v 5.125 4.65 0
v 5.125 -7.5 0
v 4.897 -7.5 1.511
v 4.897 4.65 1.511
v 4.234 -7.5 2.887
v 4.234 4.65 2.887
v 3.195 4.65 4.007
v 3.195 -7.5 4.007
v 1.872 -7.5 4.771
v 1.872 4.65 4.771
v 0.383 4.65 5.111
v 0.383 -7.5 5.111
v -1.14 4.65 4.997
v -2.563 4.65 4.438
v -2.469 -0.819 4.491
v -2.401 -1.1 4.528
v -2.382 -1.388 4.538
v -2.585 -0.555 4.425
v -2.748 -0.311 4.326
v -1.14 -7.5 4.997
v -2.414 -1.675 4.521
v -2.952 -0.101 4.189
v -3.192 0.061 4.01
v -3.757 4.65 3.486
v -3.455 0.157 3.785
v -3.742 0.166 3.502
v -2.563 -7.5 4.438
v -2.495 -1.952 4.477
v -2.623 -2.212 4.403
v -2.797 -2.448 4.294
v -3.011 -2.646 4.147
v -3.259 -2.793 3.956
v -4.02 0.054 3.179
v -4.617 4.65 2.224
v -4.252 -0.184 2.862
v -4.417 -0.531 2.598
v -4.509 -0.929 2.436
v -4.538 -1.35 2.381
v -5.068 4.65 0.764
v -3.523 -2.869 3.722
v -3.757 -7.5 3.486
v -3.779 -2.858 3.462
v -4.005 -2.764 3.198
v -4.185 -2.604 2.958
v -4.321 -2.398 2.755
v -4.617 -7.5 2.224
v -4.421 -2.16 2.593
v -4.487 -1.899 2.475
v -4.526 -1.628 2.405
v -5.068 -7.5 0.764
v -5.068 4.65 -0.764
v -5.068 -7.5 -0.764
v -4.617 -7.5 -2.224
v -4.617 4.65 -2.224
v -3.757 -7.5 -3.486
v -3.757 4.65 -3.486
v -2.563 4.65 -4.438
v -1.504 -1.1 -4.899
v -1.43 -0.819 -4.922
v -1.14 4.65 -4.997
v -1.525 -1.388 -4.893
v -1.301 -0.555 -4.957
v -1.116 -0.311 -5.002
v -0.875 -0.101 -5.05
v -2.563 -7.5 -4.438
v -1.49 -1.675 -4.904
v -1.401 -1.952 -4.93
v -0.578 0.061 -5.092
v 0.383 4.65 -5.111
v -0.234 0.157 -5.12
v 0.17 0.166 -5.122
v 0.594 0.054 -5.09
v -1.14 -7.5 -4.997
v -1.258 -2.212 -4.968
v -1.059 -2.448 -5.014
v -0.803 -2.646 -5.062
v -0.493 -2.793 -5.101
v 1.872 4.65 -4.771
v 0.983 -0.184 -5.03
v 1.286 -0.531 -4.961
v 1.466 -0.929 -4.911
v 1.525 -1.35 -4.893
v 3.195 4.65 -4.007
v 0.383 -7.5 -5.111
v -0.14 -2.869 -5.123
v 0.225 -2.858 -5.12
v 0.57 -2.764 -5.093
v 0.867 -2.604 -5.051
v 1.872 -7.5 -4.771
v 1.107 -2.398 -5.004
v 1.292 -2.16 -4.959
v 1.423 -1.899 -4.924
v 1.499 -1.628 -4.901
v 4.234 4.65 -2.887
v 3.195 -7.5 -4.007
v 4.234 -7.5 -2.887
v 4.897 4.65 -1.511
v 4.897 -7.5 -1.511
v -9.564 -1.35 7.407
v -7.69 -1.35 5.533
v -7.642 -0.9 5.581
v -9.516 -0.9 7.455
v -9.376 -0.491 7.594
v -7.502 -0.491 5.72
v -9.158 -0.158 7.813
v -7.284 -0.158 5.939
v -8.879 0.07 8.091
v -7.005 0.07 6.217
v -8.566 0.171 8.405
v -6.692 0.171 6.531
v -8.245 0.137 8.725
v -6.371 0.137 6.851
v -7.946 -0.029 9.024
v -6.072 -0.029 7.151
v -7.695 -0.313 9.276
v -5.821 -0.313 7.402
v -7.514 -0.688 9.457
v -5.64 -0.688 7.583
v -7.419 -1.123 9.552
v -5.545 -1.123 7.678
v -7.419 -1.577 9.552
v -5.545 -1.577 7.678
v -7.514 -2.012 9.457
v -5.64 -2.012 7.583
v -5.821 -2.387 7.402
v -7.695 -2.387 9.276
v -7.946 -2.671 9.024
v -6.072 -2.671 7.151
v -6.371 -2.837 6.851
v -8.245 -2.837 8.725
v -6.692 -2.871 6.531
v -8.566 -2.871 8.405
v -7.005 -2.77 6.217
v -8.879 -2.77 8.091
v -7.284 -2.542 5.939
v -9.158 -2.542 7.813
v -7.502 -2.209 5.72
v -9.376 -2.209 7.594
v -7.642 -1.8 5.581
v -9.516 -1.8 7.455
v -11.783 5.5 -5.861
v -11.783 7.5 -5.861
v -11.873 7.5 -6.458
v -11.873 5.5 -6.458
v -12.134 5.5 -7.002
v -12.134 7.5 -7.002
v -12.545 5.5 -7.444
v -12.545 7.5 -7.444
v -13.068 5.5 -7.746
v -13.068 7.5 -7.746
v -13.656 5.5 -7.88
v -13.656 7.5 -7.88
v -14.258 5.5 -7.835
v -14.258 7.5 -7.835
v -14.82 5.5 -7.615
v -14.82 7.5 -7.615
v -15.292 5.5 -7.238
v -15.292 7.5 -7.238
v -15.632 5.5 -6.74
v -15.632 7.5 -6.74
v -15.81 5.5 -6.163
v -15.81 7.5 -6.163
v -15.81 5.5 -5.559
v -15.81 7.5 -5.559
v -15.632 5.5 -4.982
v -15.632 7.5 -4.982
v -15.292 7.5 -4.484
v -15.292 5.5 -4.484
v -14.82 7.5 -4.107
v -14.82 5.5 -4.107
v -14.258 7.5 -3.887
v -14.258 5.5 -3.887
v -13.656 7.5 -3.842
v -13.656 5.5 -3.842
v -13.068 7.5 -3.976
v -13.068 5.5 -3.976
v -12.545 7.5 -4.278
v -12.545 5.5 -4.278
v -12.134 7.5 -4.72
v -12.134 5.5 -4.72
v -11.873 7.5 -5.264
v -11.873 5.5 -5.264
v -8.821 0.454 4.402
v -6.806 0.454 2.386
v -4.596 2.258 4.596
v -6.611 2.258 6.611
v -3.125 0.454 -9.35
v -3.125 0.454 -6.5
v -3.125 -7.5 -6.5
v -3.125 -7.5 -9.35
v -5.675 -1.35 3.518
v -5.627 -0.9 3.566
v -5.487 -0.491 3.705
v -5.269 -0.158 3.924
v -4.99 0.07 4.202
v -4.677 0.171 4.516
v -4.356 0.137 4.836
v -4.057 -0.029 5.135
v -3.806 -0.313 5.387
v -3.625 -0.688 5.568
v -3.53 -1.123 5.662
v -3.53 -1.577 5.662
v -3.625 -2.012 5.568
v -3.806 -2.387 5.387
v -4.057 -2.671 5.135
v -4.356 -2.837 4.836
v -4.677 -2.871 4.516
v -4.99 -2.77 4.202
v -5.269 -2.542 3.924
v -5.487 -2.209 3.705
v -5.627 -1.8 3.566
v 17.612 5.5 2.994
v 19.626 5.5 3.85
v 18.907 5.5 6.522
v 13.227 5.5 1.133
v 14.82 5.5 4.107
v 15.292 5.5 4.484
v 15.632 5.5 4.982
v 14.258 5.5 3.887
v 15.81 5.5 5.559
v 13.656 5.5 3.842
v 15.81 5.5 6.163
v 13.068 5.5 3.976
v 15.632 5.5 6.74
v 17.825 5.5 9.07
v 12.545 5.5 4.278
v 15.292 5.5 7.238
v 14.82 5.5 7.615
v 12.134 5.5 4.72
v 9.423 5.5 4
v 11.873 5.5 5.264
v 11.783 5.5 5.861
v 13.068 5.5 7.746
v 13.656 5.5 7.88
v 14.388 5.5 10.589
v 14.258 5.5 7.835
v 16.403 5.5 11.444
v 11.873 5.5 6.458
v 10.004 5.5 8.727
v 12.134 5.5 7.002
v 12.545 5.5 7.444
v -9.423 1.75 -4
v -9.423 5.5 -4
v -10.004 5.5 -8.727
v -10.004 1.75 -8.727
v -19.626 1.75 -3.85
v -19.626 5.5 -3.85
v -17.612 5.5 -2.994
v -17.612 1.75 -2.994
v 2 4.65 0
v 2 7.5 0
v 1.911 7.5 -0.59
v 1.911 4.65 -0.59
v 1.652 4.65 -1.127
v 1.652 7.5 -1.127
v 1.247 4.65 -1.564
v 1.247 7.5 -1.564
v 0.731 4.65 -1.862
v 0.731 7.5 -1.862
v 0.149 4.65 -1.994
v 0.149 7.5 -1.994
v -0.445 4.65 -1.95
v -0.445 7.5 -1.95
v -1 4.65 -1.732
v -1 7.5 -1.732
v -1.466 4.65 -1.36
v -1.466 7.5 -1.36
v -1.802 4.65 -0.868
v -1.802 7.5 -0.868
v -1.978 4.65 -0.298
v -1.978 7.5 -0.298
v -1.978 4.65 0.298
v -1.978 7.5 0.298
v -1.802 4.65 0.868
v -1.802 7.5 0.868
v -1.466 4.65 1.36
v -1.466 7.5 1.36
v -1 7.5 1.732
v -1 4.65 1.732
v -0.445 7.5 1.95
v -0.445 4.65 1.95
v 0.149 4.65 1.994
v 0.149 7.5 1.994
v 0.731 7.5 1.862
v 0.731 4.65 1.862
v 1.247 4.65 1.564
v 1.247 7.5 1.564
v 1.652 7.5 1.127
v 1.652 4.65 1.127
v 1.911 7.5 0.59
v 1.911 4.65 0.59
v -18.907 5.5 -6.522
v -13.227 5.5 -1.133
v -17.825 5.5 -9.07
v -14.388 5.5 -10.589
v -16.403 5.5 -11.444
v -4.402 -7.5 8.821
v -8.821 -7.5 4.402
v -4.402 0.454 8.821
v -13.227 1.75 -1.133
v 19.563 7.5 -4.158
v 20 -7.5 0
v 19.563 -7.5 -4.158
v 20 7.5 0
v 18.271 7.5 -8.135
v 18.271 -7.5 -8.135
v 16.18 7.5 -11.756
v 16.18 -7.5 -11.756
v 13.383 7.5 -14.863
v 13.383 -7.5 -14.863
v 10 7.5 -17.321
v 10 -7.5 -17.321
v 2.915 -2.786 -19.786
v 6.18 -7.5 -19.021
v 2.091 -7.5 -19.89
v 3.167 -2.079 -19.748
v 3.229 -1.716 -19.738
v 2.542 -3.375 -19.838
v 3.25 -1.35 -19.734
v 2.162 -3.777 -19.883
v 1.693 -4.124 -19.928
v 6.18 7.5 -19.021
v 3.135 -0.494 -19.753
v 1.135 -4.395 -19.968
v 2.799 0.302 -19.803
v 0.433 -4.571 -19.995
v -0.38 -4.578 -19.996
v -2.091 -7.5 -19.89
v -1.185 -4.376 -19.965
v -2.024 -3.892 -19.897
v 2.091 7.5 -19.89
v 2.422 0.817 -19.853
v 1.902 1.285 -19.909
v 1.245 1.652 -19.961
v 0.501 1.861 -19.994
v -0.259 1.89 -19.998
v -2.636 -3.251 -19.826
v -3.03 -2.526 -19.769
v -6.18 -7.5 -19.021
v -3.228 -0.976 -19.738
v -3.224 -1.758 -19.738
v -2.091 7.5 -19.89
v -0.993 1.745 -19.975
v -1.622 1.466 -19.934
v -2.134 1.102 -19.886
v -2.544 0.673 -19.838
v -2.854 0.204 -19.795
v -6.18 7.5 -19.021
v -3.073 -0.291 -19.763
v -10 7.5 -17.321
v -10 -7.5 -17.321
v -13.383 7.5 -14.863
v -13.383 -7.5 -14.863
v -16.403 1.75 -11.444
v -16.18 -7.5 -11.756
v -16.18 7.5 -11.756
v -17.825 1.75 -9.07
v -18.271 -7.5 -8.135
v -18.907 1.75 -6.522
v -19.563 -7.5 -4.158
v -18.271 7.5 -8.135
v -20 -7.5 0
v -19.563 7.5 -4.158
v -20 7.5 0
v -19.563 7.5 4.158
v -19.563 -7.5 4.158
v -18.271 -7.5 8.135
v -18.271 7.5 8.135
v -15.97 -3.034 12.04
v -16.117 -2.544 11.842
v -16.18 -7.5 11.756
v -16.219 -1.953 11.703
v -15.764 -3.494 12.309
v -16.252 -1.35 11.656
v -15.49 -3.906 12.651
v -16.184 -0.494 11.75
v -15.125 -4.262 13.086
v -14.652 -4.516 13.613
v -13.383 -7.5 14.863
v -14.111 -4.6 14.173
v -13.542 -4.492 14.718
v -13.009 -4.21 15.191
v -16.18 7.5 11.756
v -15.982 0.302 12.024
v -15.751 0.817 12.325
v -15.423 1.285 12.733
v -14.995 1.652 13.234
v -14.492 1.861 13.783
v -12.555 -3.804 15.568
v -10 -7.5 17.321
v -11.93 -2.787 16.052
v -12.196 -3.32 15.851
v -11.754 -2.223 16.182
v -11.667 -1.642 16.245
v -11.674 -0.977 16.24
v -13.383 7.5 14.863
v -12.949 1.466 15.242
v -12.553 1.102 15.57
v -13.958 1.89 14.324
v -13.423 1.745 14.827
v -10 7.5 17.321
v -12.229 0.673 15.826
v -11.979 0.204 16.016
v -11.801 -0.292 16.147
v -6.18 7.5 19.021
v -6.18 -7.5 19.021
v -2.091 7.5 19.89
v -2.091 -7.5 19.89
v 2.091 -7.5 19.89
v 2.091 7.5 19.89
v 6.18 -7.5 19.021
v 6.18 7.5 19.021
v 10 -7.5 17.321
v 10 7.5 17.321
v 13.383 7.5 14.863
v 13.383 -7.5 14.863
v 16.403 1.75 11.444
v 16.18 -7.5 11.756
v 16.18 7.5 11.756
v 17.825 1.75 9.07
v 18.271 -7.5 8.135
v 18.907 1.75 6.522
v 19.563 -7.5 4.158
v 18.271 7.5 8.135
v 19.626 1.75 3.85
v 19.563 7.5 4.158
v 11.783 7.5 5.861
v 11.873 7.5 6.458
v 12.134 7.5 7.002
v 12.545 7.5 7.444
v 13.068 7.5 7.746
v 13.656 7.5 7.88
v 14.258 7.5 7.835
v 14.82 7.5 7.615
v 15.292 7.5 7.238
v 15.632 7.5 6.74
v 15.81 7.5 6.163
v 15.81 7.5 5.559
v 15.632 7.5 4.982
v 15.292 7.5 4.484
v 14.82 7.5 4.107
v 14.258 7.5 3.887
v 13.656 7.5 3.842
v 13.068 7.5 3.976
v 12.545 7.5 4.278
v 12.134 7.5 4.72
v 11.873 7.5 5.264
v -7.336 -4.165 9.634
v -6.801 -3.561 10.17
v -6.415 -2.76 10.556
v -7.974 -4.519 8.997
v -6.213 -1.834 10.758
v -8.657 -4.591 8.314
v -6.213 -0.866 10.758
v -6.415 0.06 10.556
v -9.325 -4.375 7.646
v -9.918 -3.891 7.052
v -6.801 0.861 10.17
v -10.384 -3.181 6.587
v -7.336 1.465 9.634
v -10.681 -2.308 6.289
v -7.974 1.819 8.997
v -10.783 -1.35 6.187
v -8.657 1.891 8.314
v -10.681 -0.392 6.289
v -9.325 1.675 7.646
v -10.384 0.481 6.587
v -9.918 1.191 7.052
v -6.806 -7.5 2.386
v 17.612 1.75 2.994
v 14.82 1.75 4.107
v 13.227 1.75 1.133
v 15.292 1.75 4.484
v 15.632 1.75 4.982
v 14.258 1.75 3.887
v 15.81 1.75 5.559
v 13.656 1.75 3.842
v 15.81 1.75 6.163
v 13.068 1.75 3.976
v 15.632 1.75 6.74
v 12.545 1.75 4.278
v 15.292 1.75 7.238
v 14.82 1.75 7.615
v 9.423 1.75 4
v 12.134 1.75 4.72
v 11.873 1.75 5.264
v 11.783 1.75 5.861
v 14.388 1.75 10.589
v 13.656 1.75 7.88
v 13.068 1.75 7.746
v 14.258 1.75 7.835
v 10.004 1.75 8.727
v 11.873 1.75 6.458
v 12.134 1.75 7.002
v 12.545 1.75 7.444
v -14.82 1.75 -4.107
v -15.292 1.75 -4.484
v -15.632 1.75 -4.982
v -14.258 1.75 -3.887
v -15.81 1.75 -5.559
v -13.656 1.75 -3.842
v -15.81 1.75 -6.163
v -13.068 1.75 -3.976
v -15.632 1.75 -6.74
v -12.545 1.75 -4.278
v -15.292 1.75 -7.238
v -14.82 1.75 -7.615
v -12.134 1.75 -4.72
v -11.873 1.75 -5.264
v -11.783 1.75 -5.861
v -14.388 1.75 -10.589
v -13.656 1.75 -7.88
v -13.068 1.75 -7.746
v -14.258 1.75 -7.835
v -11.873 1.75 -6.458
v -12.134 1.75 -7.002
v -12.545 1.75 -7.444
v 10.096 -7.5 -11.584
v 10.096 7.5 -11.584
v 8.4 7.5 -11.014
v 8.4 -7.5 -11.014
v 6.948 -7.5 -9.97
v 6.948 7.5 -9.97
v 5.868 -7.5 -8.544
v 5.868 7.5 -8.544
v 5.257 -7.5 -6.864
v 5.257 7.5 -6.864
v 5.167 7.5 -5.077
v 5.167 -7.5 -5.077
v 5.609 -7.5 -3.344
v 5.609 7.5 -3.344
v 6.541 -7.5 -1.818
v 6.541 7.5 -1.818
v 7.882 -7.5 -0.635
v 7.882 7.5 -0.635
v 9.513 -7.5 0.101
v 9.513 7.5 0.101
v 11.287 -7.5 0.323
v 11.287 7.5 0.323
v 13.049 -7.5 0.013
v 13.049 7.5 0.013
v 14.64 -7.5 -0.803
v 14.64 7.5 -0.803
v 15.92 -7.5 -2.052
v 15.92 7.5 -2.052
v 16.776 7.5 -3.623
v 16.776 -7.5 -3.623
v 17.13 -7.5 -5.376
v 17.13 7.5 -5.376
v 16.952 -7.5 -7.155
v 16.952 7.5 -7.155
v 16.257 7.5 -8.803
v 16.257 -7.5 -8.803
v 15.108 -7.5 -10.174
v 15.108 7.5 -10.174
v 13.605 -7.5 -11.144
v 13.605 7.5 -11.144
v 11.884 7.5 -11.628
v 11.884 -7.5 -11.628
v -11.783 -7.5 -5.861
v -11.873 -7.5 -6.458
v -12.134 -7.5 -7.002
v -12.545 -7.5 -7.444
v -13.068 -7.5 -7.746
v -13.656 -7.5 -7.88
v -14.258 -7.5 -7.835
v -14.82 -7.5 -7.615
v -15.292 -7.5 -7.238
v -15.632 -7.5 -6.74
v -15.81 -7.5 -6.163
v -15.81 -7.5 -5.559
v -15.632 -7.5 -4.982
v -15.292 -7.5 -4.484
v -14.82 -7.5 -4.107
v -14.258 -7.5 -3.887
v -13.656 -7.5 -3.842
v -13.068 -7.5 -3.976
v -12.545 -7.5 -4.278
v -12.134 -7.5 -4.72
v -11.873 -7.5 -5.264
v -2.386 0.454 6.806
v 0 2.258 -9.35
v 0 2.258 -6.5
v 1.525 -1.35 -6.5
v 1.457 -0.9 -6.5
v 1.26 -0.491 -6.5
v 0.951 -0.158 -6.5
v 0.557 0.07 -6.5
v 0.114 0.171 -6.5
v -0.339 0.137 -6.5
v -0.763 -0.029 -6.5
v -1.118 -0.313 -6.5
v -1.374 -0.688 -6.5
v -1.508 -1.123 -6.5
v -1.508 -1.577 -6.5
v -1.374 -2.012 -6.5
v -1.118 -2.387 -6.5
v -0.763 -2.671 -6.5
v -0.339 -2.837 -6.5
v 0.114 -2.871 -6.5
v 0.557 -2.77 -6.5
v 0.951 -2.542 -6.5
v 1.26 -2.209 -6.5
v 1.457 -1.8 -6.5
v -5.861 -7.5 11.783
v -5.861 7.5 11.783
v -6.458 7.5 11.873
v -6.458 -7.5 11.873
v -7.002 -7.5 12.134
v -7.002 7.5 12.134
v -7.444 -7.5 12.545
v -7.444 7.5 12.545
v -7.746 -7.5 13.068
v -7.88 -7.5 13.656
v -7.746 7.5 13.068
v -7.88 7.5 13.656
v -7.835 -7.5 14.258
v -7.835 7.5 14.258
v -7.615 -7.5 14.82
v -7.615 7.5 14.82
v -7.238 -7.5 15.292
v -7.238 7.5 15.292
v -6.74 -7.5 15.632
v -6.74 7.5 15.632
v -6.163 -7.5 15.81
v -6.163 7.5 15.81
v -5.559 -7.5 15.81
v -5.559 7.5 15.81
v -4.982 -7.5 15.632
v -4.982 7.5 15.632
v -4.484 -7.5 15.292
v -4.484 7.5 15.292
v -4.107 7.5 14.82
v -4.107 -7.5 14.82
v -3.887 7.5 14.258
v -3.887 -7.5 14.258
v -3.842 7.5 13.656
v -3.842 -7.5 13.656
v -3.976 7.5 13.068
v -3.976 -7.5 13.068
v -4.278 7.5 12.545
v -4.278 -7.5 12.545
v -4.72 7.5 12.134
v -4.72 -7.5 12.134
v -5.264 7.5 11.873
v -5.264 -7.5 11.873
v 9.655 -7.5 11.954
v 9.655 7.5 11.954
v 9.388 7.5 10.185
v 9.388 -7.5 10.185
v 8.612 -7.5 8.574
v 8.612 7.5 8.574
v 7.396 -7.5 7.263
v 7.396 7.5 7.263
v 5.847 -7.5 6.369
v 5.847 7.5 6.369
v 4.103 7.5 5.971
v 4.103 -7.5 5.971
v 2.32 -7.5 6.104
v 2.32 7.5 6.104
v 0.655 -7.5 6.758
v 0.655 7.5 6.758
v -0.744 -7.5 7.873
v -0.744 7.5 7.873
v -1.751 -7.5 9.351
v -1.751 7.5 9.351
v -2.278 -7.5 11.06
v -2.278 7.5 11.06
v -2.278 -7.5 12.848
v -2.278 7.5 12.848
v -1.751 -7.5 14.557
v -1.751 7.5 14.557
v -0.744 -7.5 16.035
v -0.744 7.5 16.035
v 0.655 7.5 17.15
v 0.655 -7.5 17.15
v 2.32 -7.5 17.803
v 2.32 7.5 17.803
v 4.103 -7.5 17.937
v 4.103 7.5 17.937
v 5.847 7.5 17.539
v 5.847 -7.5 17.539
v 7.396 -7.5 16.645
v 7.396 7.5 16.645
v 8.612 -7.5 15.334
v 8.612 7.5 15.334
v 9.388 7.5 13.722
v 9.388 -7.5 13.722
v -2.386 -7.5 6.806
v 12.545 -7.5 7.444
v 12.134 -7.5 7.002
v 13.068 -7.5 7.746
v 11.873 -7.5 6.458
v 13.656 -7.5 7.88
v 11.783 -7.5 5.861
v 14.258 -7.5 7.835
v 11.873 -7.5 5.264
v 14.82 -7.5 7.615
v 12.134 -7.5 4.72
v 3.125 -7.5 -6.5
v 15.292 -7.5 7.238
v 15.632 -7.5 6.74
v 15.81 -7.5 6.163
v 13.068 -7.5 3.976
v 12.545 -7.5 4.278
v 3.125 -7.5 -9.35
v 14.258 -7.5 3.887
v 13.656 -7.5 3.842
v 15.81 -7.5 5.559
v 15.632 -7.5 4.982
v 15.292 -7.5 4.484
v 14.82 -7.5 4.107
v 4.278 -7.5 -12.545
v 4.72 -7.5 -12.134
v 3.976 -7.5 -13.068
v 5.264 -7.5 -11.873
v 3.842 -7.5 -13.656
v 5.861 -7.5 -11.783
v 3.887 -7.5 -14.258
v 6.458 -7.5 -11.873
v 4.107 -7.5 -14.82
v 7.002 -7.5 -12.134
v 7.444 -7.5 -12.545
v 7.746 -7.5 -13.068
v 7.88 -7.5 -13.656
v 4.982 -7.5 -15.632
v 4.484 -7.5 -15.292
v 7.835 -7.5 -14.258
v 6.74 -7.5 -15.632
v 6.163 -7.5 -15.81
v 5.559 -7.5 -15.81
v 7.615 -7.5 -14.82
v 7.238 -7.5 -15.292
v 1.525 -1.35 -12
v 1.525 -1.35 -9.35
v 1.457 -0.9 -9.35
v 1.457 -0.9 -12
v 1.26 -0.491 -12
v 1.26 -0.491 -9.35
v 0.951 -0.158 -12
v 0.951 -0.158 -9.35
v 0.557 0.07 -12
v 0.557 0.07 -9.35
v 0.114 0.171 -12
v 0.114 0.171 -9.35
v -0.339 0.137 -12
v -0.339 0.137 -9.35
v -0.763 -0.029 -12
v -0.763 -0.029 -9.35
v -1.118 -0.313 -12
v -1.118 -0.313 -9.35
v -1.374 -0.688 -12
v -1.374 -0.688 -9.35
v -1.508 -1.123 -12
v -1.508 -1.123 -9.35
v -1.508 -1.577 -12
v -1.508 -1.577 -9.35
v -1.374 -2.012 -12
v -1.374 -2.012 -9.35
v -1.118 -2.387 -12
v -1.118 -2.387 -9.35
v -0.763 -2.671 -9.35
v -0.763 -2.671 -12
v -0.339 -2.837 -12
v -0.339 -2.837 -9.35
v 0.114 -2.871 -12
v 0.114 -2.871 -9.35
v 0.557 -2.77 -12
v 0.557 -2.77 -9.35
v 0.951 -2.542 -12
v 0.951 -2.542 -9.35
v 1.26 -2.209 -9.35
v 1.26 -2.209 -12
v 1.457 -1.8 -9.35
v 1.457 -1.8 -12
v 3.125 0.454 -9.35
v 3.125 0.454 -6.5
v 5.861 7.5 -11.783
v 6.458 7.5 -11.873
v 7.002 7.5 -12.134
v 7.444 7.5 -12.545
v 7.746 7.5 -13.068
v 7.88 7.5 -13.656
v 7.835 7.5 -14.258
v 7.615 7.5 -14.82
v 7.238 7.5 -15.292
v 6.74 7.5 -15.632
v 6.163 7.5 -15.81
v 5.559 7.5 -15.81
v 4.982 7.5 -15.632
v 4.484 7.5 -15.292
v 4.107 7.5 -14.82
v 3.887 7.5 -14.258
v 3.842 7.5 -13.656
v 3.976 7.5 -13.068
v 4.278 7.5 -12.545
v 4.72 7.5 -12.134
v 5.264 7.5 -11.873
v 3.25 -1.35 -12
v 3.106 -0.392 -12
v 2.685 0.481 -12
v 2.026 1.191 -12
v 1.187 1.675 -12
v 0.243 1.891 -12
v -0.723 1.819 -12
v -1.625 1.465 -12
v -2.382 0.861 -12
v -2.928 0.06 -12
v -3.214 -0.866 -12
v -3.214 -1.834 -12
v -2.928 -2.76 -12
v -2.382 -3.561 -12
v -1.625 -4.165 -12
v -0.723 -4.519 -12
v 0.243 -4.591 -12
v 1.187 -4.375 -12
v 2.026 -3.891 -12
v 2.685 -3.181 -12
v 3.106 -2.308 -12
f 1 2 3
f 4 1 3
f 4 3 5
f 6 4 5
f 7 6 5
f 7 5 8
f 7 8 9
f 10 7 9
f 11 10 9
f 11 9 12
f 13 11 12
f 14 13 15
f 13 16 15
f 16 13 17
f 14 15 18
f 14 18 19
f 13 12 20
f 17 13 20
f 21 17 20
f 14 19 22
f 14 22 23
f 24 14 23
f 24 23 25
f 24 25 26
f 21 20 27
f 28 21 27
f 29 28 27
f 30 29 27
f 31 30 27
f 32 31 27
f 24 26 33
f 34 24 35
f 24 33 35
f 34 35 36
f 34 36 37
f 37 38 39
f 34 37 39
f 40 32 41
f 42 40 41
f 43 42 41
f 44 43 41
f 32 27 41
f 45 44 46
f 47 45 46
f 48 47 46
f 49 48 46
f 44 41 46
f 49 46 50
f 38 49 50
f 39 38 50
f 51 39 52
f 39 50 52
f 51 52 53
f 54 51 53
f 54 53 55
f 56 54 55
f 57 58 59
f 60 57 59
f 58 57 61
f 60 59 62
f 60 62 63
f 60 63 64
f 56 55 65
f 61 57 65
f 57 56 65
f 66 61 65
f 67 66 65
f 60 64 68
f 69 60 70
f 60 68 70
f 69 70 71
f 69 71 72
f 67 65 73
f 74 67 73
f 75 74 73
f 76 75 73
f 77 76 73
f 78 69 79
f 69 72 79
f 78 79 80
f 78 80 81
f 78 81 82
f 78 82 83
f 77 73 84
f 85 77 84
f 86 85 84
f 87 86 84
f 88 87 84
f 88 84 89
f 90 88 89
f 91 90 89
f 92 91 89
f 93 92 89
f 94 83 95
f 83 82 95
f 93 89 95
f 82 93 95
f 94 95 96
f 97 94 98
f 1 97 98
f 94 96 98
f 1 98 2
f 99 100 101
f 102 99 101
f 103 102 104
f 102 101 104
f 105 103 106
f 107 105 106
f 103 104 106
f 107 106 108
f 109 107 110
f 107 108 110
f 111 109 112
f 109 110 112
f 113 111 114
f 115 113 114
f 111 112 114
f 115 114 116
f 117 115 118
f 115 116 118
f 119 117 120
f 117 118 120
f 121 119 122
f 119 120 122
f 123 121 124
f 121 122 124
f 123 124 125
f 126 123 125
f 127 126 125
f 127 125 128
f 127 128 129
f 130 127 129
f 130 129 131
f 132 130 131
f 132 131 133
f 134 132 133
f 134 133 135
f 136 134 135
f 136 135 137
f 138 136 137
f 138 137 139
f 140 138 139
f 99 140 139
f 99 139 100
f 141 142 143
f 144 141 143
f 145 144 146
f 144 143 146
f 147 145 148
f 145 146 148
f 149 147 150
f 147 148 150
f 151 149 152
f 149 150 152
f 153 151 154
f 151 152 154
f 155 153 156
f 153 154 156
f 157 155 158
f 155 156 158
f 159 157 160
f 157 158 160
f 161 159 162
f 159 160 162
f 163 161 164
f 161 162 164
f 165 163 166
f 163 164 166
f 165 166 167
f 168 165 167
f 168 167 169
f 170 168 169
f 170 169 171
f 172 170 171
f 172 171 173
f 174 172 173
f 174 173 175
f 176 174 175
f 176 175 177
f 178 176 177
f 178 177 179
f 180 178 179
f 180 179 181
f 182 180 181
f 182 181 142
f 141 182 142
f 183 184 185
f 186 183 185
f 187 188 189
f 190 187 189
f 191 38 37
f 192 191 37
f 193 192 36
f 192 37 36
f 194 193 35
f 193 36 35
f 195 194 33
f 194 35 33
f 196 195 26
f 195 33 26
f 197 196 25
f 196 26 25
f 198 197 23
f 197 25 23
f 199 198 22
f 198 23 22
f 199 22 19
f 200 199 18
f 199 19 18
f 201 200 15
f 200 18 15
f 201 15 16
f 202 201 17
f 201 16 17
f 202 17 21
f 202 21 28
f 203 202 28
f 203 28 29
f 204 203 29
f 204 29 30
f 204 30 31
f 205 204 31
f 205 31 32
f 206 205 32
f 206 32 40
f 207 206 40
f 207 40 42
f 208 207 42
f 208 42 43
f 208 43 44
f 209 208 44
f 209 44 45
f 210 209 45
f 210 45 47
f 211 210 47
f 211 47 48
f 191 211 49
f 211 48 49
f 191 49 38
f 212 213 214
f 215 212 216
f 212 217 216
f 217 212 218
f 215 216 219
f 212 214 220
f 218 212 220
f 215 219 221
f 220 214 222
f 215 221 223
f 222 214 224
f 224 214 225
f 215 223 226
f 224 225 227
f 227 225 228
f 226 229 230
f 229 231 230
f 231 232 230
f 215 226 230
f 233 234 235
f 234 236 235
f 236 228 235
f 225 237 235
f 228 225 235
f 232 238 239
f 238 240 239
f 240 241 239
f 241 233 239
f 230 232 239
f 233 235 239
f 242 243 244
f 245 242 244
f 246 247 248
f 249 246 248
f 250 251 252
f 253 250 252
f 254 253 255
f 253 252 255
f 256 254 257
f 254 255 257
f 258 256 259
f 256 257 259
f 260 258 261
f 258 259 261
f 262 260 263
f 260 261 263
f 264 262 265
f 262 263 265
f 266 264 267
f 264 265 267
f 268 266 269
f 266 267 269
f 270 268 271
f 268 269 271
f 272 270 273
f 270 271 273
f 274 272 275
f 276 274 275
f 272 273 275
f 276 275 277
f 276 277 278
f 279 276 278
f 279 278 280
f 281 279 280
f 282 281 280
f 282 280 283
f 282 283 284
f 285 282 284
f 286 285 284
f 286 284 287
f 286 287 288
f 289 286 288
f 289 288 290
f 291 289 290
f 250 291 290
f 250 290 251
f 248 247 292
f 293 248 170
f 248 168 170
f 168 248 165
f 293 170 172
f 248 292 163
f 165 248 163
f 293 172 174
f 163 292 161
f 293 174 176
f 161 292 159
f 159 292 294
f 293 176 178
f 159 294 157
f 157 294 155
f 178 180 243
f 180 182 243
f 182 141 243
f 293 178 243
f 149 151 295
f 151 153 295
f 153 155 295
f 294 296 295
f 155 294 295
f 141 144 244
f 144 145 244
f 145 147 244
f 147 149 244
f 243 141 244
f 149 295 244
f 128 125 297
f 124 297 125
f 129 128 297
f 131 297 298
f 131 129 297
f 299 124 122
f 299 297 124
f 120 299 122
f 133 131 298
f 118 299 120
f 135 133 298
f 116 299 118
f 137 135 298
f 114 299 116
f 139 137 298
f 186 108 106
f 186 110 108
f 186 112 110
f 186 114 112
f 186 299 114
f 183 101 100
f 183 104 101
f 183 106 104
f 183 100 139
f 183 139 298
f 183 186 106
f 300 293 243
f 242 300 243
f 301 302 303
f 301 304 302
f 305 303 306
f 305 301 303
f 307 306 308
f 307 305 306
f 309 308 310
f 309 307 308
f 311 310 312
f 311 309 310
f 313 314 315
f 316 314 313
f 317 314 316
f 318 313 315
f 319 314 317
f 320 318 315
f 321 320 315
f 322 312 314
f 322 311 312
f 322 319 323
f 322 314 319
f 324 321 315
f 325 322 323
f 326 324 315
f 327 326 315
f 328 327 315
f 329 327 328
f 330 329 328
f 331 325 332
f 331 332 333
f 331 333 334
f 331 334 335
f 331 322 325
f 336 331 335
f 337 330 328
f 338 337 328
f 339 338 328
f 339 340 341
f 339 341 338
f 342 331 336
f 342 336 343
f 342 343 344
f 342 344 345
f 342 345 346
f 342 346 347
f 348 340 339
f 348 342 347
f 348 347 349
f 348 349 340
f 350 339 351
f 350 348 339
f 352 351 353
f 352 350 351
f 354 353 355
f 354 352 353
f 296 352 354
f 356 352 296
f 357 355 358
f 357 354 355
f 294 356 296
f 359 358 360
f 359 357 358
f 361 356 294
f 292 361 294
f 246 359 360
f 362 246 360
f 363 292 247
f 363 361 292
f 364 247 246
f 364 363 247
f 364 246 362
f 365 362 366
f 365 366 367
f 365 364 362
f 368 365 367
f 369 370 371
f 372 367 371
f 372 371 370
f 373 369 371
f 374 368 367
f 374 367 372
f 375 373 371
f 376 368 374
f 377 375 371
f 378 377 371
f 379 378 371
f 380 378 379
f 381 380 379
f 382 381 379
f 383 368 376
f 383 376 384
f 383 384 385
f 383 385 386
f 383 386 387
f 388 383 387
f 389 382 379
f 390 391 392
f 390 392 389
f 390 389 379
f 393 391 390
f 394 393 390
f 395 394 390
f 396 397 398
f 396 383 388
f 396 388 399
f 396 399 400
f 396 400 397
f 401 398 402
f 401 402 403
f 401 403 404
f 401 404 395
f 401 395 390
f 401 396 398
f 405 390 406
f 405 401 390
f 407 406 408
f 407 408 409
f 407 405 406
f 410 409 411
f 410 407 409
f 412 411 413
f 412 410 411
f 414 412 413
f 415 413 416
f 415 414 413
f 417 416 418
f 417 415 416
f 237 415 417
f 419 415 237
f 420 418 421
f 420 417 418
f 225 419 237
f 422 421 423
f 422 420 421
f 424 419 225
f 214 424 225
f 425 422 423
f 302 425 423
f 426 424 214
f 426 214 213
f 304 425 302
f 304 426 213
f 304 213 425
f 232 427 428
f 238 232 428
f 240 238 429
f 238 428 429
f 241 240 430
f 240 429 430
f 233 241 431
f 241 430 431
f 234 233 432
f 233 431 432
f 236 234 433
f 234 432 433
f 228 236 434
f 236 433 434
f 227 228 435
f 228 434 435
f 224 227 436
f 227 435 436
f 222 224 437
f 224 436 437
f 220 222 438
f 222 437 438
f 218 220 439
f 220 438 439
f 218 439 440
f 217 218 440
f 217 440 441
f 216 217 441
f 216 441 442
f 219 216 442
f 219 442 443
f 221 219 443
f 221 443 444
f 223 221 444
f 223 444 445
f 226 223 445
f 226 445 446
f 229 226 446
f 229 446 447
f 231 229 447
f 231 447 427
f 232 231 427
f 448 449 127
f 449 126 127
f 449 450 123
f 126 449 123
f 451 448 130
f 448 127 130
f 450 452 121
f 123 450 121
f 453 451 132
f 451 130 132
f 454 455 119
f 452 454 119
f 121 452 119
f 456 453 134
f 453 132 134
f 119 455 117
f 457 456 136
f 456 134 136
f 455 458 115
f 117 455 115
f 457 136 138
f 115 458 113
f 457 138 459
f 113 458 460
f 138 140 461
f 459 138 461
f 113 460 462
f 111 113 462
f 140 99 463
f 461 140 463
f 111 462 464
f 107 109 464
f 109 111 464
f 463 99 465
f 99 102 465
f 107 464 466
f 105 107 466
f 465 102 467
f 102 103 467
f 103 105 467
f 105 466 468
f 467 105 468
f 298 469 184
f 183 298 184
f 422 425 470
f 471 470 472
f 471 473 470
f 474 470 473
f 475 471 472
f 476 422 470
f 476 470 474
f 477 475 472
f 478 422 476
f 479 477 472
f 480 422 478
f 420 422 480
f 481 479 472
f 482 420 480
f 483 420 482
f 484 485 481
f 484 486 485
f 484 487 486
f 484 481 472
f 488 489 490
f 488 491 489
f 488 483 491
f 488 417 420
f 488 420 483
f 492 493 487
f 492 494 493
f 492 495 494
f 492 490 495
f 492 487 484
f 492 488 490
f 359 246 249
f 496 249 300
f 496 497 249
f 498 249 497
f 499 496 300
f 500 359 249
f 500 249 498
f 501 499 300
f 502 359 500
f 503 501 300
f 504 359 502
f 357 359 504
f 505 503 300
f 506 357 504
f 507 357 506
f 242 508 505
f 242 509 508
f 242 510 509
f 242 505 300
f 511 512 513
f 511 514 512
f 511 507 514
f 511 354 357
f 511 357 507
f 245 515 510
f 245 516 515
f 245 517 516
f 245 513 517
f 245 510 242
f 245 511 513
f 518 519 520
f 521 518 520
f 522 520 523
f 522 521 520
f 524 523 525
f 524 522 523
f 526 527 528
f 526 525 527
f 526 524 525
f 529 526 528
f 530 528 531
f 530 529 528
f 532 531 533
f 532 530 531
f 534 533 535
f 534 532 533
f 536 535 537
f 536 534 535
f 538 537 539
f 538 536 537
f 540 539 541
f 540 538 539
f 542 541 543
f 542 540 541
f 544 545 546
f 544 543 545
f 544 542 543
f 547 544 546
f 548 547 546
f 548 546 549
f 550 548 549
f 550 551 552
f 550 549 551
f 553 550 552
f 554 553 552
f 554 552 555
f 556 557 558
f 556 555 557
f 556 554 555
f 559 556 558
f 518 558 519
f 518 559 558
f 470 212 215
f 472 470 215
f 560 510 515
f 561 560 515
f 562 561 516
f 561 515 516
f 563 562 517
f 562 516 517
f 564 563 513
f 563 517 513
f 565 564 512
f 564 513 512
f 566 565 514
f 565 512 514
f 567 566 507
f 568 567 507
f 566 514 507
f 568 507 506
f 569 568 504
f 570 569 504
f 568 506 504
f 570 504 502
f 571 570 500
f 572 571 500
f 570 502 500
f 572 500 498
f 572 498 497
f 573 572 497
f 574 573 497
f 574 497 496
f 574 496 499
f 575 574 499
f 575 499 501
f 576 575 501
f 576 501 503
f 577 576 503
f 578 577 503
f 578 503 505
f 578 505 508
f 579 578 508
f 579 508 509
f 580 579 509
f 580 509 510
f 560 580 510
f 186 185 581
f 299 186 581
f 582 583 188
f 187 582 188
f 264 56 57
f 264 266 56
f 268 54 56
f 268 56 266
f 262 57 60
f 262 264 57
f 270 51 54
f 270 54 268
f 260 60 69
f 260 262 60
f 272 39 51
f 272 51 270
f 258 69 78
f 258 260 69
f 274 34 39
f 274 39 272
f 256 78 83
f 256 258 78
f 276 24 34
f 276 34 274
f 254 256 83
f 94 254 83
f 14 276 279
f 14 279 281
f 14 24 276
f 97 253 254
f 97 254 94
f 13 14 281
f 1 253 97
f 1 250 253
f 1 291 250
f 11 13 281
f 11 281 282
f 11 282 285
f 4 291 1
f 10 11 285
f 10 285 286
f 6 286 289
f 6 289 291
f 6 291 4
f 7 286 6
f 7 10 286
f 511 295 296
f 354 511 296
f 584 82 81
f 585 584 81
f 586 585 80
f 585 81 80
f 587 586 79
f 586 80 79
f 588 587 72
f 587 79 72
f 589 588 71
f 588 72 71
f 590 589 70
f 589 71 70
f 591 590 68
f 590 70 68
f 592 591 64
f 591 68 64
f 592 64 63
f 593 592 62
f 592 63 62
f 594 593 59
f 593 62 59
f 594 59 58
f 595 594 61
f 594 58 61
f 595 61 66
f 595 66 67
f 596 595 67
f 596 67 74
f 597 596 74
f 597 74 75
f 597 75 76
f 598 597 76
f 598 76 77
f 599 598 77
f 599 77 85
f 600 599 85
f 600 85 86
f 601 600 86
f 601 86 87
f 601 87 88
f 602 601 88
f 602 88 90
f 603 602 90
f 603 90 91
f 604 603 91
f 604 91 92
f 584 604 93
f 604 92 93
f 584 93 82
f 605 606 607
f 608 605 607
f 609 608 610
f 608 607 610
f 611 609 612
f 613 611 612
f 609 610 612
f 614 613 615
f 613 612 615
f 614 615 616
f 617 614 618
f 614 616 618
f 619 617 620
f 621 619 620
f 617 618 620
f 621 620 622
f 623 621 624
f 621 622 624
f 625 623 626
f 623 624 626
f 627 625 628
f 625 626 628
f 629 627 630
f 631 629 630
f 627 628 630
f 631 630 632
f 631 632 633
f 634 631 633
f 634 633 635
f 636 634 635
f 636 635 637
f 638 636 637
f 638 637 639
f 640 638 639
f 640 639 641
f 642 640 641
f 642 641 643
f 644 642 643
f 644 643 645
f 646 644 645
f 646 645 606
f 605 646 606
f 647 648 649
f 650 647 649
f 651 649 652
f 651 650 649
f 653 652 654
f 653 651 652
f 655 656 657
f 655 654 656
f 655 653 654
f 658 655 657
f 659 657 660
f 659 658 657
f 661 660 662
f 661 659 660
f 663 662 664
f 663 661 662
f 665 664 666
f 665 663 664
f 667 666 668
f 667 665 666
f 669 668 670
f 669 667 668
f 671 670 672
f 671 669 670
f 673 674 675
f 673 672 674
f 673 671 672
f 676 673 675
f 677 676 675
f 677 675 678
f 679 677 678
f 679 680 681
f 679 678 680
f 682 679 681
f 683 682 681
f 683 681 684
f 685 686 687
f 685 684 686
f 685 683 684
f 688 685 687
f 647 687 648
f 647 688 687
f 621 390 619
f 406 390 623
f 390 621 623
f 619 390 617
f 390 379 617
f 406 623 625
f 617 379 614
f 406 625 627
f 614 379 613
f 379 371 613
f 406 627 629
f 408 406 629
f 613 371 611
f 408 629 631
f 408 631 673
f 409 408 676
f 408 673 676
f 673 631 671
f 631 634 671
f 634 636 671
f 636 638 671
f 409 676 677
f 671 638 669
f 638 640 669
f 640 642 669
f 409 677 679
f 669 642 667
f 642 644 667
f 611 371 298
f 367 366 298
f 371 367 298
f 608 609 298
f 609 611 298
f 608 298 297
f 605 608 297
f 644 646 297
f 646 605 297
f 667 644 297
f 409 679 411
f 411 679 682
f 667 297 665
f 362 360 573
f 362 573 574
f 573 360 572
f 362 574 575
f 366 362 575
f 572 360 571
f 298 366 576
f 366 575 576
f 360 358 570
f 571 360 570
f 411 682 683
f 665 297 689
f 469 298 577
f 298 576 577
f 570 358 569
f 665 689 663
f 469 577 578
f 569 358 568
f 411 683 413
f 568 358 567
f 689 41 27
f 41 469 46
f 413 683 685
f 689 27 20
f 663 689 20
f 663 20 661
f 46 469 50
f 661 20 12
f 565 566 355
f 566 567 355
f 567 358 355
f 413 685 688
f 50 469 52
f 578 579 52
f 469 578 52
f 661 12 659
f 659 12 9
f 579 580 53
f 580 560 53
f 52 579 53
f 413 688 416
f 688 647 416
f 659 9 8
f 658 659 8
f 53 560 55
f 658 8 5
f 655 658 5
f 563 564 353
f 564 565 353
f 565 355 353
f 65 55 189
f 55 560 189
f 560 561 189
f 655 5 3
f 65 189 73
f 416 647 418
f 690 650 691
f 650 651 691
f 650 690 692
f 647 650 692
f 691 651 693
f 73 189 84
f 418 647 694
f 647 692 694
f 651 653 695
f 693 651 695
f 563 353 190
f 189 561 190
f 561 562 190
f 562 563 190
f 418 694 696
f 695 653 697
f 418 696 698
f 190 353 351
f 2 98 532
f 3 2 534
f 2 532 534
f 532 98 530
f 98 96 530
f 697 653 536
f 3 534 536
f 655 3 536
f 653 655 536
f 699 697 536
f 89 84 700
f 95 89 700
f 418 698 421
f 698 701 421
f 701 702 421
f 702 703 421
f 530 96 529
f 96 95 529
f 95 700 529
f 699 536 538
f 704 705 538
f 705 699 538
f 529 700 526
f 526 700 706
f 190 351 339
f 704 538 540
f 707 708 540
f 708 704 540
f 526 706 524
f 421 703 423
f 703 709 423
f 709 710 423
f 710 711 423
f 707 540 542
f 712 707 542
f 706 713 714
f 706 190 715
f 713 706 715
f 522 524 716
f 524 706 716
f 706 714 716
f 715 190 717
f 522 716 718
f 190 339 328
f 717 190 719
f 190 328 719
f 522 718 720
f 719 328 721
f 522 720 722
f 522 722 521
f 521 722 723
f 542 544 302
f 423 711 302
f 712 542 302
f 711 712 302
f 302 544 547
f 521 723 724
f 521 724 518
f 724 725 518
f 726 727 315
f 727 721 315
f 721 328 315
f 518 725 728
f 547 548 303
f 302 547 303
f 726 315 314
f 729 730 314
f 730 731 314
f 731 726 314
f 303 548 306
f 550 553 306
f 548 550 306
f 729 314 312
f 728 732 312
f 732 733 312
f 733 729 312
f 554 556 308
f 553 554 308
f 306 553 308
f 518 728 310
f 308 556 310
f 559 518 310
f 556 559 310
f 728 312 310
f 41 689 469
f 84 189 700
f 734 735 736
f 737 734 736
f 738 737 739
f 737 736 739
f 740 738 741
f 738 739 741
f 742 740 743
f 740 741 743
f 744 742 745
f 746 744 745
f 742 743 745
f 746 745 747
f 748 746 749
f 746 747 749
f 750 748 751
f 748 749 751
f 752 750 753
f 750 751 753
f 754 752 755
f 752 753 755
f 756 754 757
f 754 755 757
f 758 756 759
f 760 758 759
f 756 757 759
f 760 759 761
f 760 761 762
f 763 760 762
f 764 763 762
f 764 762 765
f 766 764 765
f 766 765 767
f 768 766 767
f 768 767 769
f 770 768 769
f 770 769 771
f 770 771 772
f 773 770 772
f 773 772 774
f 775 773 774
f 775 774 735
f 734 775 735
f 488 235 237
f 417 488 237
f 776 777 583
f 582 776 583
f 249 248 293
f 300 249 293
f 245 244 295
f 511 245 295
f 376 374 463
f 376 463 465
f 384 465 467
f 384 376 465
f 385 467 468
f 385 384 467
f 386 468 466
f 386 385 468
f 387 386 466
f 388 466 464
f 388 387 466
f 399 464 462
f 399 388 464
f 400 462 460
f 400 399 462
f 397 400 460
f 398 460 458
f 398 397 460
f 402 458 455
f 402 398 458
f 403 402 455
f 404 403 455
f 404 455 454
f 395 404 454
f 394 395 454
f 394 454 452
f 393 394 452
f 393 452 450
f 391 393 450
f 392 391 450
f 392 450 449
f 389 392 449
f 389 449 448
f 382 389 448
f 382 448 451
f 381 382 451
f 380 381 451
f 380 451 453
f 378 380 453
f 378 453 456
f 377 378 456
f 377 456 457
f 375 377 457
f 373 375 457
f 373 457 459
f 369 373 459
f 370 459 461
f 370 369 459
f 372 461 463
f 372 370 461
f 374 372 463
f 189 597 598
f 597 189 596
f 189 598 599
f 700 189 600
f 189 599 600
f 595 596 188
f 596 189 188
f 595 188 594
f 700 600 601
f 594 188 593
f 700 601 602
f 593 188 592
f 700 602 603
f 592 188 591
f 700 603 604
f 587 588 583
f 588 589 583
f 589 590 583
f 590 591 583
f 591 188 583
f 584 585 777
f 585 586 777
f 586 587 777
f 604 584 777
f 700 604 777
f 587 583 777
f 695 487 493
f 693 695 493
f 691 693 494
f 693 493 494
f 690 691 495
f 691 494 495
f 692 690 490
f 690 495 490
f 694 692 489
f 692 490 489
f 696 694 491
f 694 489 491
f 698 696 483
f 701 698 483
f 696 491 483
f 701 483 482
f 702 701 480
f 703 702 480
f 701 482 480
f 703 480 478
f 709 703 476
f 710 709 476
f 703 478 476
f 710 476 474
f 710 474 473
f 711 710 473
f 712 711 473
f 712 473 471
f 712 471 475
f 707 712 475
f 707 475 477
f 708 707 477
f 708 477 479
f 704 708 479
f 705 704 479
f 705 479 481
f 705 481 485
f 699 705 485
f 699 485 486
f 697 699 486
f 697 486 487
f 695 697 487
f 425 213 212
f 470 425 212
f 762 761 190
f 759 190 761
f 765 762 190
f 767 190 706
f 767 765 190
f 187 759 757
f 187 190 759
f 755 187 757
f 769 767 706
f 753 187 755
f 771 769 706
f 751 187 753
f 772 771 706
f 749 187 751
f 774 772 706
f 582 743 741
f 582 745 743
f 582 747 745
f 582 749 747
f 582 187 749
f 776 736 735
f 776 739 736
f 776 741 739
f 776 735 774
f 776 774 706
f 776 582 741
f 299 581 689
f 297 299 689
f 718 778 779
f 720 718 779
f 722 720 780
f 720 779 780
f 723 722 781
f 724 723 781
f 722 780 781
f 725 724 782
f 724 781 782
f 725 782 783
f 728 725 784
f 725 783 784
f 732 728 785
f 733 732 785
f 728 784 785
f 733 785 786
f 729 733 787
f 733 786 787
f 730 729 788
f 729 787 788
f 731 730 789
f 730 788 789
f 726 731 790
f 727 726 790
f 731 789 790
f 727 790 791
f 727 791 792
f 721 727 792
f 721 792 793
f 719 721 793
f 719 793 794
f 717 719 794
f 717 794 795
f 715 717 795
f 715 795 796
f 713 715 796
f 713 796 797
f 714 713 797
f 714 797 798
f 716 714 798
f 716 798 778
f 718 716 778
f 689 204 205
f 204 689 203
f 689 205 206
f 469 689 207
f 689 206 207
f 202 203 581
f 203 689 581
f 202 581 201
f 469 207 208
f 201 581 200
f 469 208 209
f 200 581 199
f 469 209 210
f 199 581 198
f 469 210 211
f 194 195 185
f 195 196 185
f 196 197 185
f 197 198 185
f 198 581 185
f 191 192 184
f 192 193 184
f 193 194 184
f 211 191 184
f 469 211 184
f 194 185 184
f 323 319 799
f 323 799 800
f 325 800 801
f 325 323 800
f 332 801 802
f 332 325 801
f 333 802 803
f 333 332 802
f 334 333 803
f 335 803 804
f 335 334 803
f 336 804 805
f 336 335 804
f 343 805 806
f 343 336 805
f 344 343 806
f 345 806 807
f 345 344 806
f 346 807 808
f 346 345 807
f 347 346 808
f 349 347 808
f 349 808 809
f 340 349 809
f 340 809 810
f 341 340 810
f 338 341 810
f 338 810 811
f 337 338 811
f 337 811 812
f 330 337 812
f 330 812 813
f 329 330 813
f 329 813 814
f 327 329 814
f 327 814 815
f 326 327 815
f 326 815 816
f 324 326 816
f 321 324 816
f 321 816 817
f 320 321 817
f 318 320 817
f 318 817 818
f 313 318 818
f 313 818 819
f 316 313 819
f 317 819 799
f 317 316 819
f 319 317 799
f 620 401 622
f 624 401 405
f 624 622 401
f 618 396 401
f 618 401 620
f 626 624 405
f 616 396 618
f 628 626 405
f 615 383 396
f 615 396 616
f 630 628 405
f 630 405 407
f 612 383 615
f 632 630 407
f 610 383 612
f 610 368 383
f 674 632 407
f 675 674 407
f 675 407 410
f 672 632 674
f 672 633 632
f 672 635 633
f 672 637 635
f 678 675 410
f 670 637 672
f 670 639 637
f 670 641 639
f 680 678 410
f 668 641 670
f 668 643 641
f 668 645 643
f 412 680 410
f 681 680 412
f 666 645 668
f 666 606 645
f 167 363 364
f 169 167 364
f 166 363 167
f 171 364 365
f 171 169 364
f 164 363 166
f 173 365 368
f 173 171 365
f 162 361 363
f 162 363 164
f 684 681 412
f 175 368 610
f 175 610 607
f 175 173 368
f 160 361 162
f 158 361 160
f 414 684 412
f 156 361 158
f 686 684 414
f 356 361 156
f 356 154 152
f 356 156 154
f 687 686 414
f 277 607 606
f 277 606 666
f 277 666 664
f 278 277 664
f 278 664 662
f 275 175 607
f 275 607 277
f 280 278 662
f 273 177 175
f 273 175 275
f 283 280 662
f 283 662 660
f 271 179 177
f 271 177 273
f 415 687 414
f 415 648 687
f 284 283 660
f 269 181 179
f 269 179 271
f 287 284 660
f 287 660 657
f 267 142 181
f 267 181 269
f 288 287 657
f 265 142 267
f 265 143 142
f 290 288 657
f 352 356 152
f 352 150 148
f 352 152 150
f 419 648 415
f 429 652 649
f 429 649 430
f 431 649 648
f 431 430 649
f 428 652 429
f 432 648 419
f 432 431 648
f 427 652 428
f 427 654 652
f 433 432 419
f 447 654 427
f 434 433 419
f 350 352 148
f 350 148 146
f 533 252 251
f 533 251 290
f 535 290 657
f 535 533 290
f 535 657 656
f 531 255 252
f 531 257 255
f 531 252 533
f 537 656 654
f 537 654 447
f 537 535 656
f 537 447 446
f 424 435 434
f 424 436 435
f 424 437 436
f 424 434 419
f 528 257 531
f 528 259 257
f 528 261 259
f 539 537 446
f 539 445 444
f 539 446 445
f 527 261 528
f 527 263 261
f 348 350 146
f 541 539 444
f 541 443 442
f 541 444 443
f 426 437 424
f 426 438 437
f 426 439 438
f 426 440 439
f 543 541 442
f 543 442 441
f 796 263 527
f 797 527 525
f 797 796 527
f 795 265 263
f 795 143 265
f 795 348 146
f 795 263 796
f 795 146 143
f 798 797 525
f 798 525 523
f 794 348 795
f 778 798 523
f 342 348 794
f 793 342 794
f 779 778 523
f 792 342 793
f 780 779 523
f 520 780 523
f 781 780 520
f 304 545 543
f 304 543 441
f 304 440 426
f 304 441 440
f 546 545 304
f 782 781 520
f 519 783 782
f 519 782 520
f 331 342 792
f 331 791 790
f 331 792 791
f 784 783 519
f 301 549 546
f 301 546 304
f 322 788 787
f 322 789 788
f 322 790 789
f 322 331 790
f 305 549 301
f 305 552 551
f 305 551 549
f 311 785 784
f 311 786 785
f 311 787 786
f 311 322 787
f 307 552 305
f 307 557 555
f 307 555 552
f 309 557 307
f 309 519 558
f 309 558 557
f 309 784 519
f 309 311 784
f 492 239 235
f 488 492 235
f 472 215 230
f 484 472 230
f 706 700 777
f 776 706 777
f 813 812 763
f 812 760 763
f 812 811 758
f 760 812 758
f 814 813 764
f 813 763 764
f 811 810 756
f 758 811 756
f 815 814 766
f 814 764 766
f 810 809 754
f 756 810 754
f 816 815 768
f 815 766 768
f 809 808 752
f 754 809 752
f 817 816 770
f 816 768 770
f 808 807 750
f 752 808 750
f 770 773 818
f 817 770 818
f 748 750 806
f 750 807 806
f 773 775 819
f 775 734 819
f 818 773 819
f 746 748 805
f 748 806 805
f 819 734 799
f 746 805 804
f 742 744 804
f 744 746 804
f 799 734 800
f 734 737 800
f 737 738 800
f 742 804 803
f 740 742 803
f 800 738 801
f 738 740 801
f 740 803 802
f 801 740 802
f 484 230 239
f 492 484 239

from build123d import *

# Parameters (mm, degrees)
SKETCH1_R               = 20
BOSS_EXTRUDE1_DEPTH     = 7.5
SKETCH4_R               = 5.125
CUT_EXTRUDE2_DEPTH      = 12.15
SKETCH5_R               = 2
CUT_EXTRUDE3_DEPTH      = 1
CUT_EXTRUDE3_DEPTH_BACK = 16
SKETCH2_R               = 2.025
CUT_EXTRUDE1_DEPTH      = 16
CIRPATTERN1_COUNT       = 4
SKETCH6_R               = 1.525
CUT_EXTRUDE4_DEPTH      = 21
CUT_EXTRUDE5_START      = -20
SKETCH7_R               = 3.25
CUT_EXTRUDE5_DEPTH      = 8
CUT_EXTRUDE11_START     = -6.5
CUT_EXTRUDE11_DEPTH     = 2.85
CIRPATTERN2_COUNT       = 2
CIRPATTERN2_ANGLE       = 135
CUT_EXTRUDE7_START      = 5.5
CUT_EXTRUDE7_DEPTH      = 3.75
CIRPATTERN3_COUNT       = 2
CUT_EXTRUDE12_START     = -16.0000001
SKETCH10_R              = 6
CUT_EXTRUDE12_DEPTH     = 17.0000002
CIRPATTERN4_COUNT       = 2
CIRPATTERN4_ANGLE       = 100


with BuildPart() as part:
    # Sketch1 → Boss-Extrude1 (new body, symmetric)
    with BuildSketch(Plane(origin=(0, 0, 0), x_dir=(1, 0, 0), z_dir=(0, 1, 0))):
        Circle(SKETCH1_R)
    extrude(amount=BOSS_EXTRUDE1_DEPTH, both=True)

    # Sketch4 → Cut-Extrude2 (cut)
    with BuildSketch(Plane.XZ.offset(7.5)):
        Circle(SKETCH4_R)
    extrude(amount=-CUT_EXTRUDE2_DEPTH, mode=Mode.SUBTRACT)

    # Sketch5 → Cut-Extrude3 (cut, two sides)
    with BuildSketch(Plane(origin=(0, 7.5, 0), x_dir=(1, 0, 0), z_dir=(0, 1, 0))) as cut_extrude3_sk:
        Circle(SKETCH5_R)
    extrude(amount=CUT_EXTRUDE3_DEPTH, mode=Mode.SUBTRACT)
    extrude(cut_extrude3_sk.sketch, amount=-CUT_EXTRUDE3_DEPTH_BACK, mode=Mode.SUBTRACT)

    # Sketch2 → Cut-Extrude1 (cut, through all)
    with BuildSketch(Plane(origin=(0, 7.5, 0), x_dir=(1, 0, 0), z_dir=(0, 1, 0))):
        with Locations((-13.807572802, 5.860966927)):
            Circle(SKETCH2_R)
    cut_extrude1 = extrude(amount=-CUT_EXTRUDE1_DEPTH, mode=Mode.SUBTRACT)

    # CirPattern1: Cut-Extrude1 ×4 about axis
    cirpattern1_axis = Axis((0, 0, 0), (0, 1, 0))
    for i in range(1, CIRPATTERN1_COUNT):
        add(cut_extrude1.rotate(cirpattern1_axis, i * 360 / CIRPATTERN1_COUNT), mode=Mode.SUBTRACT)

    # Sketch6 → Cut-Extrude4 (cut, through all)
    with BuildSketch(Plane.XY):
        with Locations((0, -1.35)):
            Circle(SKETCH6_R)
    cut_extrude4 = extrude(amount=-CUT_EXTRUDE4_DEPTH, mode=Mode.SUBTRACT)

    # Sketch7 → Cut-Extrude5 (cut)
    with BuildSketch(Plane.XY.offset(CUT_EXTRUDE5_START)):
        with Locations((0, -1.35)):
            Circle(SKETCH7_R)
    cut_extrude5 = extrude(amount=CUT_EXTRUDE5_DEPTH, mode=Mode.SUBTRACT)

    # Sketch9 → Cut-Extrude11 (cut)
    with BuildSketch(Plane.XY.offset(CUT_EXTRUDE11_START)):
        Polygon((3.125, -3.154219591), (3.125, 0.454219591), (0, 2.258439182), (-3.125, 0.454219591), (-3.125, -3.154219591), (-3.125, -7.670640979), (3.125, -7.670640979), align=None)
    cut_extrude11 = extrude(amount=-CUT_EXTRUDE11_DEPTH, mode=Mode.SUBTRACT)

    # CirPattern2: Cut-Extrude4, Cut-Extrude5, Cut-Extrude11 ×2 about axis
    cirpattern2_axis = Axis((0, 0, 0), (0, 1, 0))
    for i in range(1, CIRPATTERN2_COUNT):
        add(cut_extrude4.rotate(cirpattern2_axis, i * CIRPATTERN2_ANGLE / (CIRPATTERN2_COUNT - 1)), mode=Mode.SUBTRACT)
        add(cut_extrude5.rotate(cirpattern2_axis, i * CIRPATTERN2_ANGLE / (CIRPATTERN2_COUNT - 1)), mode=Mode.SUBTRACT)
        add(cut_extrude11.rotate(cirpattern2_axis, i * CIRPATTERN2_ANGLE / (CIRPATTERN2_COUNT - 1)), mode=Mode.SUBTRACT)

    # Sketch8 → Cut-Extrude7 (cut)
    with BuildSketch(Plane(origin=(0, 0, 0), x_dir=(1, 0, 0), z_dir=(0, 1, 0)).offset(CUT_EXTRUDE7_START)):
        Polygon((-9.423079571, 3.999859969), (-10.003560281, 8.727495969), (-14.388053512, 10.588602927), (-19.566381078, 12.786672569), (-22.789912888, 5.192507528), (-17.611585322, 2.994437886), (-13.227092091, 1.133330928), align=None)
    cut_extrude7 = extrude(amount=-CUT_EXTRUDE7_DEPTH, mode=Mode.SUBTRACT)

    # CirPattern3: Cut-Extrude7 ×2 about axis
    cirpattern3_axis = Axis((0, 0, 0), (0, 1, 0))
    for i in range(1, CIRPATTERN3_COUNT):
        add(cut_extrude7.rotate(cirpattern3_axis, i * 360 / CIRPATTERN3_COUNT), mode=Mode.SUBTRACT)

    # Sketch10 → Cut-Extrude12 (cut)
    with BuildSketch(Plane(origin=(0, 7.5, 0), x_dir=(1, 0, 0), z_dir=(0, 1, 0)).offset(CUT_EXTRUDE12_START)):
        with Locations((3.654646309, -11.95380945)):
            Circle(SKETCH10_R)
    cut_extrude12 = extrude(amount=CUT_EXTRUDE12_DEPTH, mode=Mode.SUBTRACT)

    # CirPattern4: Cut-Extrude12 ×2 about axis
    cirpattern4_axis = Axis((0, 7.5, 0), (0, 1, 0))
    for i in range(1, CIRPATTERN4_COUNT):
        add(cut_extrude12.rotate(cirpattern4_axis, i * CIRPATTERN4_ANGLE / (CIRPATTERN4_COUNT - 1)), mode=Mode.SUBTRACT)


solid = part.part
